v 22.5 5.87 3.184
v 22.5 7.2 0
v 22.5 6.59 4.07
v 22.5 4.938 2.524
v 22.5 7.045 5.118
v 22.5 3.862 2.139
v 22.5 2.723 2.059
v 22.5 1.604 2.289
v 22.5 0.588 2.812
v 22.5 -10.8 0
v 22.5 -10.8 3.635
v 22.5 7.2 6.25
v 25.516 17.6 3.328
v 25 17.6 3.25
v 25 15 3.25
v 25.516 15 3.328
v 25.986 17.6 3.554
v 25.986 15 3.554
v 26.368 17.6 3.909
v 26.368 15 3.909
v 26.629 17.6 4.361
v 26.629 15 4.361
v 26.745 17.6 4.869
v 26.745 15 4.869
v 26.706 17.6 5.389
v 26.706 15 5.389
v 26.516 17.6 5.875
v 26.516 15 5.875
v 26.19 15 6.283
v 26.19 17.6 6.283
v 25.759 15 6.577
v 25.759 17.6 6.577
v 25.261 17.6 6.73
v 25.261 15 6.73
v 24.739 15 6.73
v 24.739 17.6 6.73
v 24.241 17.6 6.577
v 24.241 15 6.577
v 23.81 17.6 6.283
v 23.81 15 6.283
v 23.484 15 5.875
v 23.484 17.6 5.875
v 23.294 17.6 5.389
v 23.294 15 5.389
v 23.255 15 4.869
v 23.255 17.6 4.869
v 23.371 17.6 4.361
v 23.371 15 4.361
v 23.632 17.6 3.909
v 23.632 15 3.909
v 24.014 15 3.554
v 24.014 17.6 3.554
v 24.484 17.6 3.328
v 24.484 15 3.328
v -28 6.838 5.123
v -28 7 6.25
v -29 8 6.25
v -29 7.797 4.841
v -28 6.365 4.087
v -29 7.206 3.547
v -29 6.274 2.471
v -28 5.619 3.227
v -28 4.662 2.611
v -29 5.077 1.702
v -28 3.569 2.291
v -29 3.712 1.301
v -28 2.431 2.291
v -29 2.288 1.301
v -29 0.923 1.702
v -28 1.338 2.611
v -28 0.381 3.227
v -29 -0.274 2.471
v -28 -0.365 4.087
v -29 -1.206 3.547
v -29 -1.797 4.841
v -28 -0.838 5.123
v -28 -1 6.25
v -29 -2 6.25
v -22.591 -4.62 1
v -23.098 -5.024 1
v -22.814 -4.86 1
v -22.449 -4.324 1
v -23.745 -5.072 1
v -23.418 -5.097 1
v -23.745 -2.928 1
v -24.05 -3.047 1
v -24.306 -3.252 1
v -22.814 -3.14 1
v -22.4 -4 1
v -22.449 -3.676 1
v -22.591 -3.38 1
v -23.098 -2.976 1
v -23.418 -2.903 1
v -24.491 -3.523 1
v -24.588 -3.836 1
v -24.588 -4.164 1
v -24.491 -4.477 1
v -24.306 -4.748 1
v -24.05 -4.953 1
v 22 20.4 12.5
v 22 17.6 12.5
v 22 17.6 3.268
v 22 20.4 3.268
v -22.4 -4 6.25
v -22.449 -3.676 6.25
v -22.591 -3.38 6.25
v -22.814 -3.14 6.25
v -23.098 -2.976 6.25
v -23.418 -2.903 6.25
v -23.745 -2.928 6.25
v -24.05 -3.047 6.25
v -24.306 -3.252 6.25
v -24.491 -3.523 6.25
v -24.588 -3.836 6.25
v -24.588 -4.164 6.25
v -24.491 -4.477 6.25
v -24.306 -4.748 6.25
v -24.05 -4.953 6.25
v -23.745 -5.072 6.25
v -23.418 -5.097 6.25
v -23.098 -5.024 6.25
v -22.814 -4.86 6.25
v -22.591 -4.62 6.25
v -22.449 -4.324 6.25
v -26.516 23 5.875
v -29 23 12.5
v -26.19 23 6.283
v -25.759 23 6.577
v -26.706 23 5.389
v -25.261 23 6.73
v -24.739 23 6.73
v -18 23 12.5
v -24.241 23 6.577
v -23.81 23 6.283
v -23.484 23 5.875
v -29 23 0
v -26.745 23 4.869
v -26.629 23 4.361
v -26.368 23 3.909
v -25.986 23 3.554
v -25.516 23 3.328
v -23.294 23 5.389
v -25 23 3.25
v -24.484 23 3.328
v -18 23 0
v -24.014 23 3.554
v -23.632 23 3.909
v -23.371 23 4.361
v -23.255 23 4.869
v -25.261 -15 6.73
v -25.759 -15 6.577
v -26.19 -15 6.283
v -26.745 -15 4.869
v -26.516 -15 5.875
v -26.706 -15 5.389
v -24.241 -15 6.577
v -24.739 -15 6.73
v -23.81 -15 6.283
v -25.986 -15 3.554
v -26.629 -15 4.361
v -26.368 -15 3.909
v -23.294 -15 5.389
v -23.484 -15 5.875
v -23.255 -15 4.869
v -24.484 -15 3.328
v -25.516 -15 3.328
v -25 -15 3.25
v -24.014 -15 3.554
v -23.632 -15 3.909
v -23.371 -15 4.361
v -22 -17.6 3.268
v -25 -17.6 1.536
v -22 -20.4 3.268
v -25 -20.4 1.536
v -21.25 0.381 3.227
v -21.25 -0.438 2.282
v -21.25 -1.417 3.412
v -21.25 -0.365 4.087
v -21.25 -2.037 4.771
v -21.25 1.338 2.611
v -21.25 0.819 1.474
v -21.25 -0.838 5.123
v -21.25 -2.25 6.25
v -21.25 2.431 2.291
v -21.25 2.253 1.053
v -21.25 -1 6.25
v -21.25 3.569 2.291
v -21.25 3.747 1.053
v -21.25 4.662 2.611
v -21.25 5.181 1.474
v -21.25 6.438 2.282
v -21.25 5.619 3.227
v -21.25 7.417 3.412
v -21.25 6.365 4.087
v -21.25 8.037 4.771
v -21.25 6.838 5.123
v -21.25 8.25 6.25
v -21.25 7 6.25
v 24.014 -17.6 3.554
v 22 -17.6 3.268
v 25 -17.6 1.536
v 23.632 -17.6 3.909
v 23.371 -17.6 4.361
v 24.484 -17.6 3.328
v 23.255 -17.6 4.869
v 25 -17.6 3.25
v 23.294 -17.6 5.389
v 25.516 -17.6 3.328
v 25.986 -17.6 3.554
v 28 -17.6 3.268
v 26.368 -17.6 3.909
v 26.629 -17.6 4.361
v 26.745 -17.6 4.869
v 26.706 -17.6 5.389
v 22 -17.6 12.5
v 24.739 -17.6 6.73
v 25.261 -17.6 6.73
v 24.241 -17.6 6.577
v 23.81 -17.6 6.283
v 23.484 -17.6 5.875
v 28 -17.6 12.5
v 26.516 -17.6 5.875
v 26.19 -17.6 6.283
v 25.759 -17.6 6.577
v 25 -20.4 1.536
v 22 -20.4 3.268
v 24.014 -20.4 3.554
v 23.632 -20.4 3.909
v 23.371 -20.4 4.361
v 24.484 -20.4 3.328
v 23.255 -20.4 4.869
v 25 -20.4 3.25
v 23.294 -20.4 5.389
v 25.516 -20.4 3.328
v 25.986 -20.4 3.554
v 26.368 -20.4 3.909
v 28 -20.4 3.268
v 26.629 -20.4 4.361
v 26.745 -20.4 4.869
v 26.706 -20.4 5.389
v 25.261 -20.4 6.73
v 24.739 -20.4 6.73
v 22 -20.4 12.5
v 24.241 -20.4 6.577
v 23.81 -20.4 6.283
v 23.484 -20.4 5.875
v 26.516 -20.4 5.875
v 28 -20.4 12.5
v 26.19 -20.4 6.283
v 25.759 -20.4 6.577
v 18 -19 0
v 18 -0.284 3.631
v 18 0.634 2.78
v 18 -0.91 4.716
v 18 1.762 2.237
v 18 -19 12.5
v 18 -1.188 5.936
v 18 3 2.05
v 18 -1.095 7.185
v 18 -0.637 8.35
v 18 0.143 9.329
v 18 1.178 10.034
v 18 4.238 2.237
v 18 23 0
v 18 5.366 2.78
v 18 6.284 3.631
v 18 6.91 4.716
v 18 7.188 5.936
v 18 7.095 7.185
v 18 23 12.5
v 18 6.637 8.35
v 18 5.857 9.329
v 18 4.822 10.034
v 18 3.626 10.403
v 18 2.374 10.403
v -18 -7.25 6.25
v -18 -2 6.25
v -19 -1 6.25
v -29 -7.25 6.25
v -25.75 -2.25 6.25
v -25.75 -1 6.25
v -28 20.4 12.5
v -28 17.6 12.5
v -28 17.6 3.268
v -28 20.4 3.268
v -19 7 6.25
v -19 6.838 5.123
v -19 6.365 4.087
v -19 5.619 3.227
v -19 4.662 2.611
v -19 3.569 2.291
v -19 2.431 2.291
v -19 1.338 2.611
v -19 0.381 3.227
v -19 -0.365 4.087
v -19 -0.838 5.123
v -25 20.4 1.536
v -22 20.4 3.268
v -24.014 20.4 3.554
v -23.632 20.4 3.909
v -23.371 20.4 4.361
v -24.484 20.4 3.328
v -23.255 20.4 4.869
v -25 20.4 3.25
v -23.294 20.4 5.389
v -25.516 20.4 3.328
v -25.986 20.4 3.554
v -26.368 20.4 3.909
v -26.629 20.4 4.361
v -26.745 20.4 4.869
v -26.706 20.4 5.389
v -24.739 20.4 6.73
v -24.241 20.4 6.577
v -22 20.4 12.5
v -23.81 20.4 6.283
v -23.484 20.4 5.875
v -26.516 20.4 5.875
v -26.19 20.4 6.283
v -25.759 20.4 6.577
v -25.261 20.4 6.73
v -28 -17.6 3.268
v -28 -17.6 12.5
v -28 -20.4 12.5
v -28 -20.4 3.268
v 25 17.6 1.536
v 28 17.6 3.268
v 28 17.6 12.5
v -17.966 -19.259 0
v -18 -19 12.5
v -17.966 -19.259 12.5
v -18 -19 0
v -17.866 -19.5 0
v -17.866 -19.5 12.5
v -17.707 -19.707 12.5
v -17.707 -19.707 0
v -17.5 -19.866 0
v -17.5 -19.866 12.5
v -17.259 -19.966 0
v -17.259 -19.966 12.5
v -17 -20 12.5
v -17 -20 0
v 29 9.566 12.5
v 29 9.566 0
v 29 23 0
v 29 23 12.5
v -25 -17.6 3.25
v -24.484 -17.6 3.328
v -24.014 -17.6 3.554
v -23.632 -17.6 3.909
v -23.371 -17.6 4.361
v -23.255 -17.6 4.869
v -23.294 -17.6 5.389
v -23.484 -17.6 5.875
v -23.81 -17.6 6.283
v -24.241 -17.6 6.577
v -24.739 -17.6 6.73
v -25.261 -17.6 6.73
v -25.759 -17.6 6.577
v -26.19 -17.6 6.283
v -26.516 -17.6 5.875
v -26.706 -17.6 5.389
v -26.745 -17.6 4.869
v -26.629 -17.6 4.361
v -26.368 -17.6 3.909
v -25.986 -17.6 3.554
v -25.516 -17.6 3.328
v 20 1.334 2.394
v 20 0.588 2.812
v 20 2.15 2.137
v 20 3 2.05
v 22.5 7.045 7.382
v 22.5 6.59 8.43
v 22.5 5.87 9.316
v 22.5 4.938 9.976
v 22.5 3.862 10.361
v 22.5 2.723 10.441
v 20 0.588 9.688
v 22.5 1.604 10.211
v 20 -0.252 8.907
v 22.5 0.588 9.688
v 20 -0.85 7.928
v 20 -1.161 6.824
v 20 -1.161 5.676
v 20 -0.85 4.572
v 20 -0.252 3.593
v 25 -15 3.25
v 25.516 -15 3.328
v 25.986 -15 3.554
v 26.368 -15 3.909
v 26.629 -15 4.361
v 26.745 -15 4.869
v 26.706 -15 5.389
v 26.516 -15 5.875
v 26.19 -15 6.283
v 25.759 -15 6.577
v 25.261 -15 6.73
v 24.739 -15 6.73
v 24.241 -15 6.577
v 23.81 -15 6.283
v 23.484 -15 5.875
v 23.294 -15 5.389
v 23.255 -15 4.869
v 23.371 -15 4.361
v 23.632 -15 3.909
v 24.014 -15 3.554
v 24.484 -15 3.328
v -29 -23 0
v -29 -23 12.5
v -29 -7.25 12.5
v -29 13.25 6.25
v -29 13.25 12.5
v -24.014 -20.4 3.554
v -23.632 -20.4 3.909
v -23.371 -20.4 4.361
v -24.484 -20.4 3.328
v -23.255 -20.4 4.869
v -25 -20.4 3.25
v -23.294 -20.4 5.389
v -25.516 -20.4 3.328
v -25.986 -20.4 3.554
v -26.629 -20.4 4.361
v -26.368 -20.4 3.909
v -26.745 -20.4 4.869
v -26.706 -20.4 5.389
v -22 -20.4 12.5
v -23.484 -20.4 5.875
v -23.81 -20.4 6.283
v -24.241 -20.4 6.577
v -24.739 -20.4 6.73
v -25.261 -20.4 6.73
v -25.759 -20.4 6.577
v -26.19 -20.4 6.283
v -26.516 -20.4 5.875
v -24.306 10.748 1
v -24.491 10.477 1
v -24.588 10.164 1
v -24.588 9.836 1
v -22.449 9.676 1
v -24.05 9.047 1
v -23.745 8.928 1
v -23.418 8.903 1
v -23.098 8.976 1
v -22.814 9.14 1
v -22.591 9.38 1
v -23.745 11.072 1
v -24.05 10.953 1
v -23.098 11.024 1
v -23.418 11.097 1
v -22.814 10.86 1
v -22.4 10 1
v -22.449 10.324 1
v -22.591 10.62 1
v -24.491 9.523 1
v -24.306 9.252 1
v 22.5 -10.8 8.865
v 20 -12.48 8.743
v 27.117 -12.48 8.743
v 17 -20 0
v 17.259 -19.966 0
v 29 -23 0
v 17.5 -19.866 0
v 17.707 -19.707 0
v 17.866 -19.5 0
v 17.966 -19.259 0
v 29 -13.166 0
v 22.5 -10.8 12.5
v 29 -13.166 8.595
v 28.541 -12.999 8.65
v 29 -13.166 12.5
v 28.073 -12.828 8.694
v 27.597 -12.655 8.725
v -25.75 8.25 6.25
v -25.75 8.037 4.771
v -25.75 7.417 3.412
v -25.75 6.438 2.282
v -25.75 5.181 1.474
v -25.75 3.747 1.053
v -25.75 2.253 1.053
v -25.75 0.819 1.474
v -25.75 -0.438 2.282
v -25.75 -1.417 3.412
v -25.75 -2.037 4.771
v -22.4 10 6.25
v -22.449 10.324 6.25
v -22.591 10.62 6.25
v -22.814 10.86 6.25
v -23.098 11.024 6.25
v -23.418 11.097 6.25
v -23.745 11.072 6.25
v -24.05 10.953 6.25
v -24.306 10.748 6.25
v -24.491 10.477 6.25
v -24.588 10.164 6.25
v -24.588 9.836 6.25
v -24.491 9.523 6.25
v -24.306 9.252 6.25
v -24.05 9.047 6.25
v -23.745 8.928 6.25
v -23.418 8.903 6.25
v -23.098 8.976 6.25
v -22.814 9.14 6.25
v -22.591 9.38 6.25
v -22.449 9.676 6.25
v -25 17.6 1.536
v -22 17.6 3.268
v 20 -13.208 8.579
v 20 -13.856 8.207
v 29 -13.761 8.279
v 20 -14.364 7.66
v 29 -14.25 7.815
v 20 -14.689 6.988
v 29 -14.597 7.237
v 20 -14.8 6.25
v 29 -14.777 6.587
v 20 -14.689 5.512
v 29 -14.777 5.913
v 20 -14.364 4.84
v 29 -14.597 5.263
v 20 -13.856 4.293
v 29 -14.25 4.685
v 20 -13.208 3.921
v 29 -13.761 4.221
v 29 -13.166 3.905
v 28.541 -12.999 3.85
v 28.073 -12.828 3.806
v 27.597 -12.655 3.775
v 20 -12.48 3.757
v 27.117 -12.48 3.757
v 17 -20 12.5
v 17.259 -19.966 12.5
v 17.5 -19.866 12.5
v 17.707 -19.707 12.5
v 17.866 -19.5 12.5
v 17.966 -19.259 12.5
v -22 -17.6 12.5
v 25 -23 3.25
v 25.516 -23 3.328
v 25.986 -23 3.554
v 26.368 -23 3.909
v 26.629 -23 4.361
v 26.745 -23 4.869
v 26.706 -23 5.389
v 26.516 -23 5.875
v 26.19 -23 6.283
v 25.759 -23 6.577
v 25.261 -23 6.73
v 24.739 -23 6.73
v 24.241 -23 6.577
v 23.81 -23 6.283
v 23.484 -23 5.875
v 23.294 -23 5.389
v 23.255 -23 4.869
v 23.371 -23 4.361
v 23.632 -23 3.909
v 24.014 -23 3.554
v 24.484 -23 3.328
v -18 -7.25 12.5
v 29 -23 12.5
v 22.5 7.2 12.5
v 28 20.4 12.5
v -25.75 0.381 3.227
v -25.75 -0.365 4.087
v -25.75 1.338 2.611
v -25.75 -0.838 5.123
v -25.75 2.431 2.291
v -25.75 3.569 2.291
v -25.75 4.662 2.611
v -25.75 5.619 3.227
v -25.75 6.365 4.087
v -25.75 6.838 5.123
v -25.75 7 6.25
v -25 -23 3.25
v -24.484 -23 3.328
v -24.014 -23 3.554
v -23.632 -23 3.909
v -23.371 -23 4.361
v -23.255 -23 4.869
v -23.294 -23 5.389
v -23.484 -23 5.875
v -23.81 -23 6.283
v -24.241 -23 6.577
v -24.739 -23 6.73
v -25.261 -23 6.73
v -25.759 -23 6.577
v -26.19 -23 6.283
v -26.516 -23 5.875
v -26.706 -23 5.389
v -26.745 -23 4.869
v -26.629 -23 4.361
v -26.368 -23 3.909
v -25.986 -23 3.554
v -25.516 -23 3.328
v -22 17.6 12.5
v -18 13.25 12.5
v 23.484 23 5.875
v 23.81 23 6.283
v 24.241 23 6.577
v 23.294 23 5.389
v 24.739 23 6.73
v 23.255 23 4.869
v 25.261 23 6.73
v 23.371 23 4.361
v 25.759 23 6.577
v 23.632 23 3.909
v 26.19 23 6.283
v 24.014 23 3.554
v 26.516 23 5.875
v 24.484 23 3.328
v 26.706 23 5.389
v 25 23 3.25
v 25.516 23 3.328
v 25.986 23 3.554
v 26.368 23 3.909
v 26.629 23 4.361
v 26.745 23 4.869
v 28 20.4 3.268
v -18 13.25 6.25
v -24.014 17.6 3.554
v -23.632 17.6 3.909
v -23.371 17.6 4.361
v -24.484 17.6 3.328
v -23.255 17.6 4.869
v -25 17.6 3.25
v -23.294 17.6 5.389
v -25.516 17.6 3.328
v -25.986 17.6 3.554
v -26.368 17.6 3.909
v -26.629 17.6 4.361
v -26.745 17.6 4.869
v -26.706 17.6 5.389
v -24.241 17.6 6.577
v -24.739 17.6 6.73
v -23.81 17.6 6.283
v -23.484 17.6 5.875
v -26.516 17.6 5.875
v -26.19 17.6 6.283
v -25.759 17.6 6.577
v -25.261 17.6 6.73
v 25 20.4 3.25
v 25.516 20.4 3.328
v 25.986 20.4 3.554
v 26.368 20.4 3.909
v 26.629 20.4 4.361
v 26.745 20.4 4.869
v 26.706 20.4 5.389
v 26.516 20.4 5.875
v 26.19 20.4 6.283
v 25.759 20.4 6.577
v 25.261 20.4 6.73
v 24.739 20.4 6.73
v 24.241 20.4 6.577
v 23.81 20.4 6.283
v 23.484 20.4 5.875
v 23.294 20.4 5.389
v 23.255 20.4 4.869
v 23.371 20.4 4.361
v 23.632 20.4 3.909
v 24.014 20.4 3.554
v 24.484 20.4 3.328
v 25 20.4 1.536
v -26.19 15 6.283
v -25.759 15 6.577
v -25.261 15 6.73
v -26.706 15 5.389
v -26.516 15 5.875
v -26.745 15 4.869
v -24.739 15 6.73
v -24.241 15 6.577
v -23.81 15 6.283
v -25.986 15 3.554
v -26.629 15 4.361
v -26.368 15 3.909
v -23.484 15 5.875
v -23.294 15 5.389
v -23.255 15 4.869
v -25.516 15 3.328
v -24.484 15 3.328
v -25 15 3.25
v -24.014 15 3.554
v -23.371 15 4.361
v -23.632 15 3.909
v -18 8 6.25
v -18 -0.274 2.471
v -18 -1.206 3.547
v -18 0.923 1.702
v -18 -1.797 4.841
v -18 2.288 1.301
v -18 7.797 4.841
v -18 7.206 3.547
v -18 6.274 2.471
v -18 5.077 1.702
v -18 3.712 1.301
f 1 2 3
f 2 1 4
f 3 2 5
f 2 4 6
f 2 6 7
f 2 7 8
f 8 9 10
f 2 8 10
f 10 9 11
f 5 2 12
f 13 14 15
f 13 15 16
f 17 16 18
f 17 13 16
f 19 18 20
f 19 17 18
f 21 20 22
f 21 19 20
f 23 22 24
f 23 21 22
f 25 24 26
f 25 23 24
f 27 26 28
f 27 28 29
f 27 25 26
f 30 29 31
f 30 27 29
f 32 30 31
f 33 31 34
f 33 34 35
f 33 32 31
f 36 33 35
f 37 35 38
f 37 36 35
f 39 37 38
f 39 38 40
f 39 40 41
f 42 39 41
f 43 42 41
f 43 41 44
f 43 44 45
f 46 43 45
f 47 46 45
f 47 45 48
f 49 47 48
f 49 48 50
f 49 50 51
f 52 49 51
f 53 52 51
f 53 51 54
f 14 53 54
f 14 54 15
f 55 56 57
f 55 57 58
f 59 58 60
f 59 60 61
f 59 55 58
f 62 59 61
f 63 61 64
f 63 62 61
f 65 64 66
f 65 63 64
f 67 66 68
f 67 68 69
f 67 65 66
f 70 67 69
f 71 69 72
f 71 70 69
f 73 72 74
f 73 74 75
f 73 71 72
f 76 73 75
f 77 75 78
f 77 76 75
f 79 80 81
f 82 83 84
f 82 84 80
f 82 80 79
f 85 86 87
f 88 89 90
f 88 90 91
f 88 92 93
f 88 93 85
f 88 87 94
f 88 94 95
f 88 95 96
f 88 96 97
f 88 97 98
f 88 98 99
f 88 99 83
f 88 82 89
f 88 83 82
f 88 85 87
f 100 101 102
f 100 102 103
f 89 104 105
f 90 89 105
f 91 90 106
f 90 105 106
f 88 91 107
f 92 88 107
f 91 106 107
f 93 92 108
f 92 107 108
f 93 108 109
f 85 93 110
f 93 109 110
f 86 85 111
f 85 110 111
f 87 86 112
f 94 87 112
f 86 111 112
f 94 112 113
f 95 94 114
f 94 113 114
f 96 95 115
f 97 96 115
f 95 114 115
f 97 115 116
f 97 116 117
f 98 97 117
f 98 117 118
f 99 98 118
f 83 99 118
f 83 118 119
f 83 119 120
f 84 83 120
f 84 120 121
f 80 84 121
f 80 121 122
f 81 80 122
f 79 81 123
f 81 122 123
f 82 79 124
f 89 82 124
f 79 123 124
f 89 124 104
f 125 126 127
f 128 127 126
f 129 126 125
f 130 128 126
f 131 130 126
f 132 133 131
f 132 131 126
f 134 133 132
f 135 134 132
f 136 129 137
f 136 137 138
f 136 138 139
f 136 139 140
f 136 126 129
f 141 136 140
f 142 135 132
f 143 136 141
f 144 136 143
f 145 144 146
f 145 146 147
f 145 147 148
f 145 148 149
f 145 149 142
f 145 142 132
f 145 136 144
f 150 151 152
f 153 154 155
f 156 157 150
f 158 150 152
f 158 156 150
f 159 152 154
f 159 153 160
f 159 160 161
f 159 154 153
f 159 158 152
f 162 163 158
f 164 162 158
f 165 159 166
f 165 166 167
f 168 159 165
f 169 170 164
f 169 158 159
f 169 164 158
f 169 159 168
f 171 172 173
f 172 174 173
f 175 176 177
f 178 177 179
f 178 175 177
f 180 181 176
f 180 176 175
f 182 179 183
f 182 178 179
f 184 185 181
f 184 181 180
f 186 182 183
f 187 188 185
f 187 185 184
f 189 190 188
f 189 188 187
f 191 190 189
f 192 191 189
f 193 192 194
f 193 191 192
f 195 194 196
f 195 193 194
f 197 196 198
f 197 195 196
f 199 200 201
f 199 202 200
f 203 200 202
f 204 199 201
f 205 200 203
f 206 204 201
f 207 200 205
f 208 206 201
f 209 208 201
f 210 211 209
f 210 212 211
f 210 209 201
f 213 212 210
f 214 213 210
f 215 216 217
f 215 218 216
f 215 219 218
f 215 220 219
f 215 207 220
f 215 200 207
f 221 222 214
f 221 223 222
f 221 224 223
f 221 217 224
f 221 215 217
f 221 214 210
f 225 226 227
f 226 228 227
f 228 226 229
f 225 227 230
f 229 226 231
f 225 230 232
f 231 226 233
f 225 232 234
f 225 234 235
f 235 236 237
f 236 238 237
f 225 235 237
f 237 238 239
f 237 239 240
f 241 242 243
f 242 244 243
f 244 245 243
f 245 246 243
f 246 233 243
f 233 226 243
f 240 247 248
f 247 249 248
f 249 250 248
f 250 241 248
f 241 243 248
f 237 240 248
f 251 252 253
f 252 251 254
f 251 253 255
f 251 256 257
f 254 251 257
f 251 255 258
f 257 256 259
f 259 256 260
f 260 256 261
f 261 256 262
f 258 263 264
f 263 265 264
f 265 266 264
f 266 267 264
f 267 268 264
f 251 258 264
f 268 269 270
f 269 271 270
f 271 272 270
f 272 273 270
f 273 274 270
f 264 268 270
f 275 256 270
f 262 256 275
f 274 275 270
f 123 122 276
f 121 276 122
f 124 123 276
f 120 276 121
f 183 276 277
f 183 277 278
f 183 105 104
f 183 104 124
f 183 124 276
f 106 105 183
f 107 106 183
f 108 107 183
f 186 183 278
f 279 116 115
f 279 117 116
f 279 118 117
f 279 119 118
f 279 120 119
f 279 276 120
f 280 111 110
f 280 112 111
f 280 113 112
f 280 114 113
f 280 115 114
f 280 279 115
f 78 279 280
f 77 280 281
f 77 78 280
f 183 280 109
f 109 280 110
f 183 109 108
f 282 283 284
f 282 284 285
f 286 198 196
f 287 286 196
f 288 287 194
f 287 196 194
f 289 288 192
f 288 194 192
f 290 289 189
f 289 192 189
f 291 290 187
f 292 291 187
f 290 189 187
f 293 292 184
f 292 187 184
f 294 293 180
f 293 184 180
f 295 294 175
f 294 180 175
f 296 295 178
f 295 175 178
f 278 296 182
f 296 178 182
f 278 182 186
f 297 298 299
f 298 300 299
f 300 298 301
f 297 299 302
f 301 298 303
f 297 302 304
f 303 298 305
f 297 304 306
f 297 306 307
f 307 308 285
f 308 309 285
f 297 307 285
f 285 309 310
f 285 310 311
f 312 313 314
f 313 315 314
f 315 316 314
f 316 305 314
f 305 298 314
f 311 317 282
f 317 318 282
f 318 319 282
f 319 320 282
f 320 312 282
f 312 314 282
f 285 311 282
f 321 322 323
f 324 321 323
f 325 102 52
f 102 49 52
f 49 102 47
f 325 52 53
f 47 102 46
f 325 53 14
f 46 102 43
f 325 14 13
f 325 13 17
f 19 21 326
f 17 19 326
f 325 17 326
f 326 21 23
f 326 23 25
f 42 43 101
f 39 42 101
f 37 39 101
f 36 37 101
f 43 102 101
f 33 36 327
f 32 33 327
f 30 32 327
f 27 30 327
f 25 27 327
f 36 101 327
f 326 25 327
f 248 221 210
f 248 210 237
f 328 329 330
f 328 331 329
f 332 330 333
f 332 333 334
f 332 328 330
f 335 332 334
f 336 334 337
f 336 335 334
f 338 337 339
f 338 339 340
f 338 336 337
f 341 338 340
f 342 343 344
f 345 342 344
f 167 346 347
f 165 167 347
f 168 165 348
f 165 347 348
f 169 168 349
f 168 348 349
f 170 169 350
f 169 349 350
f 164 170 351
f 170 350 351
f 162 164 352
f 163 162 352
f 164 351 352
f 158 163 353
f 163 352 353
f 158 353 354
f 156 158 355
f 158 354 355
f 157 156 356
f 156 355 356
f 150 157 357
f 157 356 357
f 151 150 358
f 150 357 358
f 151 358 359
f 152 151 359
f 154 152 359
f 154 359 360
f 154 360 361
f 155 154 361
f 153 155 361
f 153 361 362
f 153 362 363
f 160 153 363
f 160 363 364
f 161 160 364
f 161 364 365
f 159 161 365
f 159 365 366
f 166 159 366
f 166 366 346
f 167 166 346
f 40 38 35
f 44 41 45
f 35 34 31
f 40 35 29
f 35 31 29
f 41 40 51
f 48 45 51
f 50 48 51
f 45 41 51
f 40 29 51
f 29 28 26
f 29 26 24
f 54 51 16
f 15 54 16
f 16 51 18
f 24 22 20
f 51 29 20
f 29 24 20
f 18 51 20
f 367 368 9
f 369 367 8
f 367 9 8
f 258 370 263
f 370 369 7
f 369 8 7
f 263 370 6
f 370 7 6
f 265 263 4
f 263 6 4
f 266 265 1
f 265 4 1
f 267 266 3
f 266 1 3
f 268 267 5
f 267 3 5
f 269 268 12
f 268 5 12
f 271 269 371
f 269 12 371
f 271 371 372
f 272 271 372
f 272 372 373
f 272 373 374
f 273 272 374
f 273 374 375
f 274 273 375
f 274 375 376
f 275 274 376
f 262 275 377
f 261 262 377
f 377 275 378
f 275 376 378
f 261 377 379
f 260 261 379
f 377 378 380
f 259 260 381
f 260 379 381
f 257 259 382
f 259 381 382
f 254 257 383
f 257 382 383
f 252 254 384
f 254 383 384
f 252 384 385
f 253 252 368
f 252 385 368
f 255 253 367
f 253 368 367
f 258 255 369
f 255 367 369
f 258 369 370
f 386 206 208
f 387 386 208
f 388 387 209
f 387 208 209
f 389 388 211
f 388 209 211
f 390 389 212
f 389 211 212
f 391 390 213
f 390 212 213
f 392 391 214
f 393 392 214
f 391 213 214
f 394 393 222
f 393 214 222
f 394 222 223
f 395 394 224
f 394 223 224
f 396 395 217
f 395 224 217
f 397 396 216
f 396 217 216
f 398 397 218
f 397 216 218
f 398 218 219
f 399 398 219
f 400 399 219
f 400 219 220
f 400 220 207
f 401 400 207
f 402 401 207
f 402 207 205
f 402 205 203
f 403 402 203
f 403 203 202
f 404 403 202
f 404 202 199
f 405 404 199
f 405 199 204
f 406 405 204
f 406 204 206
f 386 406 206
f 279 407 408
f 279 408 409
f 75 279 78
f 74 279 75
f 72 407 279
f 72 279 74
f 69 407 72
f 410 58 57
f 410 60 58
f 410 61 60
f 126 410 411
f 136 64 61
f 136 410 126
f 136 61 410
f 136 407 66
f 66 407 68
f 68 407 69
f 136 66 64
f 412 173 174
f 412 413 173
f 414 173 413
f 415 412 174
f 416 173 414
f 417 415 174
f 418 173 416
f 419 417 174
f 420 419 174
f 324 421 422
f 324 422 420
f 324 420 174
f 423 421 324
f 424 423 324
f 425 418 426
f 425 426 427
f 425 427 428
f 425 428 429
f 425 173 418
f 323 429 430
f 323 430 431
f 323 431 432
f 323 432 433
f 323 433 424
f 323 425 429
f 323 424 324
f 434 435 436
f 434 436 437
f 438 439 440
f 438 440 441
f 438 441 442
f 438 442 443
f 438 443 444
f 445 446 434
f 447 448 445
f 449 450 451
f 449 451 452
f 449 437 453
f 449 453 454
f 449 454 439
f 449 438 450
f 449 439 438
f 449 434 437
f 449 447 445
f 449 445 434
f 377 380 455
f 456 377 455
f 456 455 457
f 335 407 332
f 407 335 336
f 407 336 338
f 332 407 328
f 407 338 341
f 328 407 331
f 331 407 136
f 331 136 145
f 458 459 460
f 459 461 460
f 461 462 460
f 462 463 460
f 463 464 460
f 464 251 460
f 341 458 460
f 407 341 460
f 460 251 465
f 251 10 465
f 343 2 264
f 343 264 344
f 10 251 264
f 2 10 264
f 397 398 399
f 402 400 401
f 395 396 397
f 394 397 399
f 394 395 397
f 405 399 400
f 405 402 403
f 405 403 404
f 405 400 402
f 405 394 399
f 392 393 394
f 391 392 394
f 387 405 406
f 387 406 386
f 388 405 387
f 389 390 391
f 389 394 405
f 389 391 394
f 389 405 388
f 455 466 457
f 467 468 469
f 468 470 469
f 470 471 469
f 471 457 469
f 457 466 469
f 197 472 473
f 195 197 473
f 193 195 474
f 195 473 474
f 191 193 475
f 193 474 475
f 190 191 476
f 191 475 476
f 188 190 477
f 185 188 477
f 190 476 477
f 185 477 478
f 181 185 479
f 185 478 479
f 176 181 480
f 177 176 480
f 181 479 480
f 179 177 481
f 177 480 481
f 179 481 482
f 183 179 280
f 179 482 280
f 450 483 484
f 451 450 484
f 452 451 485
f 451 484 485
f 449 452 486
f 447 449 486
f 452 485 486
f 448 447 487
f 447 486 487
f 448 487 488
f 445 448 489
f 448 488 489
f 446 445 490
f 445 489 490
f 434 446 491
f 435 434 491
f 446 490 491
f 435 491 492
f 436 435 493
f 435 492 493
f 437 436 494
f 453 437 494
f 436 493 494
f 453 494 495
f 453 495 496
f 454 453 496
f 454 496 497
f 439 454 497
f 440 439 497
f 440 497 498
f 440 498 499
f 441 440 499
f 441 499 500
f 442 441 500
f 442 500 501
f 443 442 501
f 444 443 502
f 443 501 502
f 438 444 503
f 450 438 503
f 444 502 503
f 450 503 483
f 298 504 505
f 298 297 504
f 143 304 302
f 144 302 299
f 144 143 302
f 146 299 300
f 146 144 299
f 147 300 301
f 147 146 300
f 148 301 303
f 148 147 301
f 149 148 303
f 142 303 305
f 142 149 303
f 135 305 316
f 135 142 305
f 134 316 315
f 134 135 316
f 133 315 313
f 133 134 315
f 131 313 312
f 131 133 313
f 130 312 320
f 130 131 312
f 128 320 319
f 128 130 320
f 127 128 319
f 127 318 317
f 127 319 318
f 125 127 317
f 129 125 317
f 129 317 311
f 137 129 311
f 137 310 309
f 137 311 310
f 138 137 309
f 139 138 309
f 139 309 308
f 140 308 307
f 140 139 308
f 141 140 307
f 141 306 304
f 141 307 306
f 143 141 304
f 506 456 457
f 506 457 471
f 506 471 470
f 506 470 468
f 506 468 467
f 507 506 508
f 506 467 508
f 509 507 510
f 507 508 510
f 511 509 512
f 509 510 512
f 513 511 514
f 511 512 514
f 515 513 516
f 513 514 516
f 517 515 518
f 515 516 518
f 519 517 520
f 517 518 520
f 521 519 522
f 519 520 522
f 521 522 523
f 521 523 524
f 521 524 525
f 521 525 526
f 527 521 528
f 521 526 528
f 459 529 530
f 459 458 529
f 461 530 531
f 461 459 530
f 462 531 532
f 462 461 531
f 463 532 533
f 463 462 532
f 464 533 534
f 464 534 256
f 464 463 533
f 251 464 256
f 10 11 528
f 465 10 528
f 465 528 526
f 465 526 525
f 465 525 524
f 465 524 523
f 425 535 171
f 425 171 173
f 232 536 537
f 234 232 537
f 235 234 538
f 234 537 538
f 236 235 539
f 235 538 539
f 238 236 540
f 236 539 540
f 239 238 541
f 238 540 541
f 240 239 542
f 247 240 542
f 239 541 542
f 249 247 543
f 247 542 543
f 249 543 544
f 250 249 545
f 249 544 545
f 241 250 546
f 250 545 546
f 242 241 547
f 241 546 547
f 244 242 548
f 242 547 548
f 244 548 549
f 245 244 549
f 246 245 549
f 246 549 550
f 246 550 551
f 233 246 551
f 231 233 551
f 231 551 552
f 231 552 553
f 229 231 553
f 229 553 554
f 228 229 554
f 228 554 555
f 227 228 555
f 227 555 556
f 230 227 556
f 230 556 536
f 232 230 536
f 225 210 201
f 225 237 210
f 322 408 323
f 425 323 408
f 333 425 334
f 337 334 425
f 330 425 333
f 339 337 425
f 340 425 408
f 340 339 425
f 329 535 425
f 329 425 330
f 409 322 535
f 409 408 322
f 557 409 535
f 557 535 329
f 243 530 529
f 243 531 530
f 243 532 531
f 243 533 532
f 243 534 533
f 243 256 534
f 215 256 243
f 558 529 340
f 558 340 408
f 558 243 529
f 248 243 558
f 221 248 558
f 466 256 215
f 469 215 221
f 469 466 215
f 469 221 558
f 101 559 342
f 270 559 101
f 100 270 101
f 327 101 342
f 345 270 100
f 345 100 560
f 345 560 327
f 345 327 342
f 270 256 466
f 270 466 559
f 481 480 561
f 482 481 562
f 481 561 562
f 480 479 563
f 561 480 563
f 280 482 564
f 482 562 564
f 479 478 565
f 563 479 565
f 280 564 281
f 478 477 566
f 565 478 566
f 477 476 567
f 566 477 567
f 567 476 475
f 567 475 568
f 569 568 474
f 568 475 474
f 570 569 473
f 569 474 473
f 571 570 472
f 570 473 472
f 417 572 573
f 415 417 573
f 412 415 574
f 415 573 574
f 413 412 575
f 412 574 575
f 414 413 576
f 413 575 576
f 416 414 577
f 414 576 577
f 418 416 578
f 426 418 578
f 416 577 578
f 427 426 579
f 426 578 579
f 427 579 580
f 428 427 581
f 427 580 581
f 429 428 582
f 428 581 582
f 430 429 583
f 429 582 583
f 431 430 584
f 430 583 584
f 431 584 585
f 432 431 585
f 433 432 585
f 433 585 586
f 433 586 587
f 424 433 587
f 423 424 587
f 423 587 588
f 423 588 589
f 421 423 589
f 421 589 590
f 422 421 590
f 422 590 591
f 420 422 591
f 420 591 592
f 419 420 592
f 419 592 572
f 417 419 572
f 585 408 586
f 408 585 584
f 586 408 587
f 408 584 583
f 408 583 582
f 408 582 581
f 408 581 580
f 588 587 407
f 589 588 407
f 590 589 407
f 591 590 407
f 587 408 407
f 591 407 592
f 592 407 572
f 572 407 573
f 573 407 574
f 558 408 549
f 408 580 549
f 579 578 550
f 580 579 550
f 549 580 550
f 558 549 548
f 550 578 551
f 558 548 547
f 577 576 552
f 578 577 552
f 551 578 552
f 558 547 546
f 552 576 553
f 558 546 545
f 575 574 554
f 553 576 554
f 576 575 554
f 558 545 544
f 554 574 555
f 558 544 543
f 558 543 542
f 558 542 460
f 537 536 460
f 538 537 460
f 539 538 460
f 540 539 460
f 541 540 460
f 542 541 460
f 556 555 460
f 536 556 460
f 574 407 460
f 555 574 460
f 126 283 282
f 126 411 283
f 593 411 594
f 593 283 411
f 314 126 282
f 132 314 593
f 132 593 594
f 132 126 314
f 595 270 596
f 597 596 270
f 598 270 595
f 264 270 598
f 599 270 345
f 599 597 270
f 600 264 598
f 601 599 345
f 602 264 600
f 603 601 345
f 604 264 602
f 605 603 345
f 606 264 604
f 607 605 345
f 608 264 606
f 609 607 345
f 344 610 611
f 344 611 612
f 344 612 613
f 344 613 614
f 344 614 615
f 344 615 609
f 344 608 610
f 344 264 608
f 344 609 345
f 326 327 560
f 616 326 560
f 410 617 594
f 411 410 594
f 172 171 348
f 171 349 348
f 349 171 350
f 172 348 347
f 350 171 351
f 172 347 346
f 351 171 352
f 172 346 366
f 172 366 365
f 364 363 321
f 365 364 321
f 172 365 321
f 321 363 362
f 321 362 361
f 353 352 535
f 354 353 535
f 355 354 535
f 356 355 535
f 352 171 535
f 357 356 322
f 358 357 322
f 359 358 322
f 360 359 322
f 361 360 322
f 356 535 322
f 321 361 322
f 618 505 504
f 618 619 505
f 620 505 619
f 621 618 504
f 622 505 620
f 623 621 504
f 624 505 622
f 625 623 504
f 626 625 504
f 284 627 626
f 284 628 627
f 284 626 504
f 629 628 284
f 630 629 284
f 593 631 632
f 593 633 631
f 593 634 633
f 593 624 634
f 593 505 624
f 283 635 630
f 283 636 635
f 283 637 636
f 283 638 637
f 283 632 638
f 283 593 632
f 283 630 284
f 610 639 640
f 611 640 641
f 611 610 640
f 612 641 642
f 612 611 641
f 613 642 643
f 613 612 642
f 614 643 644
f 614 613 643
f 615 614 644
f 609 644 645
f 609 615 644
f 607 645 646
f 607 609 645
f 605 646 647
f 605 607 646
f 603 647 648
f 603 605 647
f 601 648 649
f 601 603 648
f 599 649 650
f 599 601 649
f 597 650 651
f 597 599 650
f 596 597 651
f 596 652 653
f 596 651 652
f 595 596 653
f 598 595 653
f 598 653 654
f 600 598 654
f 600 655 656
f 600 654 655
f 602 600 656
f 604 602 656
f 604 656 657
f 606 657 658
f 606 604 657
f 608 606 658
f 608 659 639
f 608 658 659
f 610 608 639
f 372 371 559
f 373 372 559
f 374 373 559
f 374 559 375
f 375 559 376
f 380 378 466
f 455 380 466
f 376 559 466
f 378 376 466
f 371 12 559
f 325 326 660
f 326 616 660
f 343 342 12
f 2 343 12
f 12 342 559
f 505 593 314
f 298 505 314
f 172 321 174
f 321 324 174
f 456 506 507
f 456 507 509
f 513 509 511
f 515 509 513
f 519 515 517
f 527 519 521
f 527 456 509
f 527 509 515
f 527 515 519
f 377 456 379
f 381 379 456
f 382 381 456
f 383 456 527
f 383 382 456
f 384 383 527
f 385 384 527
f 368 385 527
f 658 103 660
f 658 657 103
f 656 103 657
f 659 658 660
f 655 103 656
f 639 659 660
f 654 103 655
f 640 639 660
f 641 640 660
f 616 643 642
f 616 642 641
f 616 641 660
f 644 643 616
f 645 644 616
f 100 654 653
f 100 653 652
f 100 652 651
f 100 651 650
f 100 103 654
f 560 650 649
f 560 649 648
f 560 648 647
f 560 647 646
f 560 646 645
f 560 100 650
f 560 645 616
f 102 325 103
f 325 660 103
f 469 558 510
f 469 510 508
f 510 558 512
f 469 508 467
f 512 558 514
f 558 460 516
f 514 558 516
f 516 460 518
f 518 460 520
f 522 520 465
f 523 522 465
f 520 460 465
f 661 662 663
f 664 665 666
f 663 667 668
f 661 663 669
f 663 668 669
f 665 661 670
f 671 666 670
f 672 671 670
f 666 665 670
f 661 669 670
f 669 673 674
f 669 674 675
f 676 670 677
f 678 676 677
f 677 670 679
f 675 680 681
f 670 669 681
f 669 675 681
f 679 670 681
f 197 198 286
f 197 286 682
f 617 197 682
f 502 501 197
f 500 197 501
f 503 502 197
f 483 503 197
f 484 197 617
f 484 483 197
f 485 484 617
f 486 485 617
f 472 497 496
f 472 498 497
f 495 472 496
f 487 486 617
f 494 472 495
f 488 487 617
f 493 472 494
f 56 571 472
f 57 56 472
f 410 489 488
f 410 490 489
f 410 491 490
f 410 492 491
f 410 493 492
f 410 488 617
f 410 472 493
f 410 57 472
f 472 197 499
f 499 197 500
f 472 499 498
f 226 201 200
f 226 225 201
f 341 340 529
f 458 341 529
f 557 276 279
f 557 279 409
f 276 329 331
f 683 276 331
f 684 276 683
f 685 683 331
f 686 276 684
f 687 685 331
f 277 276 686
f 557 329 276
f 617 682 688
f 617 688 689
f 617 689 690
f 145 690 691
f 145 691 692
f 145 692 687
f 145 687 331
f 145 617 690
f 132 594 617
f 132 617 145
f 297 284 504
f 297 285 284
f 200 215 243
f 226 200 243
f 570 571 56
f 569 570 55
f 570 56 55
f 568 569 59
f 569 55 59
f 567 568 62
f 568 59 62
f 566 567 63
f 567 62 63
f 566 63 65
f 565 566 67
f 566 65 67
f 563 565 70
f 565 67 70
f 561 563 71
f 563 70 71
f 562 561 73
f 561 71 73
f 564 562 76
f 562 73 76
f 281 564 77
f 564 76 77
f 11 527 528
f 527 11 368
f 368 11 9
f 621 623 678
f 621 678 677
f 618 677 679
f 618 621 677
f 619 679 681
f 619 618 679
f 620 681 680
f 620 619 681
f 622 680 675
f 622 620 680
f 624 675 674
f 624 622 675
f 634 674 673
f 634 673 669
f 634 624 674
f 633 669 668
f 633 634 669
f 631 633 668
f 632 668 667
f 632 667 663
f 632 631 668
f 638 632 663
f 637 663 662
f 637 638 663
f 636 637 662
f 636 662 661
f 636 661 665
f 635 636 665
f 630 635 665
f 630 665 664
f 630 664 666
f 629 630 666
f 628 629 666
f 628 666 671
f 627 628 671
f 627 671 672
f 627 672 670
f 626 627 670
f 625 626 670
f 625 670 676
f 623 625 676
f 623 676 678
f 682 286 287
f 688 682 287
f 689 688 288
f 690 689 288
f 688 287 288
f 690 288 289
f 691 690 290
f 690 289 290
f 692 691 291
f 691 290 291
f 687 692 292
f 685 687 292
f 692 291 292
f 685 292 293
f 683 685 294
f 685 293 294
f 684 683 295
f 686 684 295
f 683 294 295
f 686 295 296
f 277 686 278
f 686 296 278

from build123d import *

# Parameters (mm, degrees)
SKETCH_1_W               = 58
SKETCH_1_H               = 46
EXTRUDE_509_DEPTH        = 12.5
SKETCH_3_W               = 36
SKETCH_3_H               = 46
CUT_EXTRUDE_752_DEPTH    = 40.067249711
SKETCH_11_R              = 1.75
CUT_EXTRUDE_1006_DEPTH   = 8
CUT_EXTRUDE_1504_DEPTH   = 9
CUT_EXTRUDE_1848_REACH   = 65.634
SKETCH_4_R               = 4.2
SKETCH_6_R               = 4
CUT_EXTRUDE_1985_DEPTH   = 11
SKETCH_7_W               = 6.25
SKETCH_7_H               = 20.5
CUT_EXTRUDE_2184_DEPTH   = 11
SKETCH_8_R               = 5.25
CUT_EXTRUDE_2361_DEPTH   = 2.25
SKETCH_9_R               = 1.1
CUT_EXTRUDE_2719_DEPTH   = 5.25
CUT_EXTRUDE_3116_DEPTH   = 40.067249711
CHAMFER_1_SIZE           = 1
FILLET_1_R               = 1
CUT_EXTRUDE_START        = -4
CUT_EXTRUDE_6414_DEPTH   = 1.4
CUT_EXTRUDE_6952_REACH   = 65.634
SKETCH_18_W              = 6
SKETCH_18_H              = 2.8
MIRROR_START             = -4
MIRROR_2_COPY_1_DEPTH    = 1.4
MIRROR_2_COPY_2_REACH    = 65.634
MIRROR_2_COPY_2_SKETCH_W = 6
MIRROR_2_COPY_2_SKETCH_H = 2.8


with BuildPart() as part:
    # Эскиз1 → Extrude 509 (new body)
    with BuildSketch(Plane.XY):
        Rectangle(SKETCH_1_W, SKETCH_1_H)
    extrude(amount=EXTRUDE_509_DEPTH)

    # Эскиз3 → Cut-Extrude 752 (cut, through all)
    with BuildSketch(Plane.XY.offset(12.5)):
        with Locations((0, 3)):
            Rectangle(SKETCH_3_W, SKETCH_3_H)
    extrude(amount=-CUT_EXTRUDE_752_DEPTH, mode=Mode.SUBTRACT)

    # Эскиз11 → Cut-Extrude 1006 (cut)
    with BuildSketch(Plane.XZ.offset(23)):
        with Locations(Location((-25, 5, 0), (0, 0, 270))):
            Circle(SKETCH_11_R)
        with Locations(Location((25, 5, 0), (0, 0, 270))):
            Circle(SKETCH_11_R)
    cut_extrude_1006 = extrude(amount=-CUT_EXTRUDE_1006_DEPTH, mode=Mode.SUBTRACT)

    # Mirror 1050: Cut-Extrude 1006 across plane
    add(cut_extrude_1006.mirror(Plane.ZX), mode=Mode.SUBTRACT)

    # Эскиз5 → Cut-Extrude 1504 (cut)
    with BuildSketch(Plane(origin=(29, 0, 0), x_dir=(0, 0, -1), z_dir=(1, 0, 0))):
        with BuildLine():
            Line((-9.688386067, 0.588050321), (-8.743490646, -12.48028976))
            ThreePointArc((-8.743490646, -12.48028976), (-6.25, -14.8), (-3.756509354, -12.48028976))
            Line((-3.756509354, -12.48028976), (-2.811613933, 0.588050321))
            ThreePointArc((-2.811613933, 0.588050321), (-6.25, 7.2), (-9.688386067, 0.588050321))
        make_face()
    extrude(amount=-CUT_EXTRUDE_1504_DEPTH, mode=Mode.SUBTRACT)

    # Эскиз4 → Cut-Extrude 1848 (cut, up to next)
    with BuildSketch(Plane(origin=(29, 0, 0), x_dir=(0, 0, -1), z_dir=(1, 0, 0)), mode=Mode.PRIVATE) as cut_extrude_1848_sk1:
        with Locations((-6.25, 3)):
            Circle(SKETCH_4_R)
    cut_extrude_1848_tool1 = extrude(cut_extrude_1848_sk1.sketch, amount=-CUT_EXTRUDE_1848_REACH, mode=Mode.PRIVATE) & part.part
    add(cut_extrude_1848_tool1.solids().sort_by_distance((29, 3, 6.25))[0], mode=Mode.SUBTRACT)

    # Эскиз6 → Cut-Extrude 1985 (cut)
    with BuildSketch(Plane.ZY.offset(29)):
        with Locations((6.25, 3)):
            Circle(SKETCH_6_R)
    extrude(amount=-CUT_EXTRUDE_1985_DEPTH, mode=Mode.SUBTRACT)

    # Эскиз7 → Cut-Extrude 2184 (cut)
    with BuildSketch(Plane.ZY.offset(29)):
        with Locations((9.375, 3)):
            Rectangle(SKETCH_7_W, SKETCH_7_H)
    extrude(amount=-CUT_EXTRUDE_2184_DEPTH, mode=Mode.SUBTRACT)

    # Эскиз8 → Cut-Extrude 2361 (cut, symmetric)
    with BuildSketch(Plane.ZY.offset(23.5)):
        with Locations((6.25, 3)):
            Circle(SKETCH_8_R)
    extrude(amount=CUT_EXTRUDE_2361_DEPTH, both=True, mode=Mode.SUBTRACT)

    # Эскиз9 → Cut-Extrude 2719 (cut)
    with BuildSketch(Plane.XY.offset(6.25)):
        with Locations((-23.5, 10)):
            Circle(SKETCH_9_R)
        with Locations((-23.5, -4)):
            Circle(SKETCH_9_R)
    extrude(amount=-CUT_EXTRUDE_2719_DEPTH, mode=Mode.SUBTRACT)

    # Эскиз10 → Cut-Extrude 3116 (cut, through all)
    with BuildSketch(Plane.XY.offset(12.5)):
        Polygon((29, -13.165806523), (29, 9.565806523), (22.5, 7.2), (22.5, -10.8), align=None)
    extrude(amount=-CUT_EXTRUDE_3116_DEPTH, mode=Mode.SUBTRACT)

    # Фаска1
    chamfer_1_edges = [part.edges().sort_by_distance(p)[0] for p in [
        (-29, 3, 2.25),
        (-18, 3, 2.25),
    ]]
    chamfer(chamfer_1_edges, length=CHAMFER_1_SIZE)

    # Скругление1
    fillet_1_edges = [part.edges().sort_by_distance(p)[0] for p in [
        (-18, -20, 6.25),
        (18, -20, 6.25),
    ]]
    fillet(fillet_1_edges, radius=FILLET_1_R)

    # Эскиз17 → Cut-Extrude 6414 (cut, symmetric)
    with BuildSketch(Plane(origin=(0, 23, 0), x_dir=(1, 0, 0), z_dir=(0, 1, 0)).offset(CUT_EXTRUDE_START)):
        Polygon((22, -3.267949192), (22, -6.732050808), (25, -8.464101615), (28, -6.732050808), (28, -3.267949192), (25, -1.535898385), align=None)
    cut_extrude_6414 = extrude(amount=CUT_EXTRUDE_6414_DEPTH, both=True, mode=Mode.SUBTRACT)

    # Эскиз18 → Cut-Extrude 6952 (cut, up to next)
    with BuildSketch(Plane(origin=(29, 0, 12.5), x_dir=(1, 0, 0), z_dir=(0, 0, 1)), mode=Mode.PRIVATE) as cut_extrude_6952_sk1:
        with Locations((-4, 19)):
            Rectangle(SKETCH_18_W, SKETCH_18_H)
    cut_extrude_6952_tool1 = extrude(cut_extrude_6952_sk1.sketch, amount=-CUT_EXTRUDE_6952_REACH, mode=Mode.PRIVATE) & part.part
    cut_extrude_6952 = cut_extrude_6952_tool1.solids().sort_by_distance((25, 19, 12.5))[0]
    add(cut_extrude_6952, mode=Mode.SUBTRACT)

    # Зеркальное отражение1: Cut-Extrude 6414, Cut-Extrude 6952 across plane
    add(cut_extrude_6414.mirror(Plane(origin=(0, 0, 0), x_dir=(0, 0, 1), z_dir=(1, 0, 0))), mode=Mode.SUBTRACT)
    add(cut_extrude_6952.mirror(Plane(origin=(0, 0, 0), x_dir=(0, 0, 1), z_dir=(1, 0, 0))), mode=Mode.SUBTRACT)

    # Зеркальное отражение2: Cut-Extrude 6414, Cut-Extrude 6952 across plane
    add(cut_extrude_6414.mirror(Plane.ZX), mode=Mode.SUBTRACT)
    add(cut_extrude_6952.mirror(Plane.ZX), mode=Mode.SUBTRACT)

    # Зеркальное отражение2 copy 1 sketch → Зеркальное отражение2 copy 1 (cut, symmetric)
    with BuildSketch(Plane(origin=(0, -23, 0), x_dir=(-1, 0, 0), z_dir=(0, -1, 0)).offset(MIRROR_START)):
        Polygon((22, -3.267949192), (22, -6.732050808), (25, -8.464101615), (28, -6.732050808), (28, -3.267949192), (25, -1.535898385), align=None)
    extrude(amount=MIRROR_2_COPY_1_DEPTH, both=True, mode=Mode.SUBTRACT)

    # Зеркальное отражение2 copy 2 sketch → Зеркальное отражение2 copy 2 (cut, up to next)
    with BuildSketch(Plane(origin=(-29, 0, 12.5), x_dir=(-1, 0, 0), z_dir=(0, 0, 1)), mode=Mode.PRIVATE) as mirror_2_copy_2_sk1:
        with Locations((-4, 19)):
            Rectangle(MIRROR_2_COPY_2_SKETCH_W, MIRROR_2_COPY_2_SKETCH_H)
    mirror_2_copy_2_tool1 = extrude(mirror_2_copy_2_sk1.sketch, amount=-MIRROR_2_COPY_2_REACH, mode=Mode.PRIVATE) & part.part
    add(mirror_2_copy_2_tool1.solids().sort_by_distance((-25, -19, 12.5))[0], mode=Mode.SUBTRACT)


solid = part.part
